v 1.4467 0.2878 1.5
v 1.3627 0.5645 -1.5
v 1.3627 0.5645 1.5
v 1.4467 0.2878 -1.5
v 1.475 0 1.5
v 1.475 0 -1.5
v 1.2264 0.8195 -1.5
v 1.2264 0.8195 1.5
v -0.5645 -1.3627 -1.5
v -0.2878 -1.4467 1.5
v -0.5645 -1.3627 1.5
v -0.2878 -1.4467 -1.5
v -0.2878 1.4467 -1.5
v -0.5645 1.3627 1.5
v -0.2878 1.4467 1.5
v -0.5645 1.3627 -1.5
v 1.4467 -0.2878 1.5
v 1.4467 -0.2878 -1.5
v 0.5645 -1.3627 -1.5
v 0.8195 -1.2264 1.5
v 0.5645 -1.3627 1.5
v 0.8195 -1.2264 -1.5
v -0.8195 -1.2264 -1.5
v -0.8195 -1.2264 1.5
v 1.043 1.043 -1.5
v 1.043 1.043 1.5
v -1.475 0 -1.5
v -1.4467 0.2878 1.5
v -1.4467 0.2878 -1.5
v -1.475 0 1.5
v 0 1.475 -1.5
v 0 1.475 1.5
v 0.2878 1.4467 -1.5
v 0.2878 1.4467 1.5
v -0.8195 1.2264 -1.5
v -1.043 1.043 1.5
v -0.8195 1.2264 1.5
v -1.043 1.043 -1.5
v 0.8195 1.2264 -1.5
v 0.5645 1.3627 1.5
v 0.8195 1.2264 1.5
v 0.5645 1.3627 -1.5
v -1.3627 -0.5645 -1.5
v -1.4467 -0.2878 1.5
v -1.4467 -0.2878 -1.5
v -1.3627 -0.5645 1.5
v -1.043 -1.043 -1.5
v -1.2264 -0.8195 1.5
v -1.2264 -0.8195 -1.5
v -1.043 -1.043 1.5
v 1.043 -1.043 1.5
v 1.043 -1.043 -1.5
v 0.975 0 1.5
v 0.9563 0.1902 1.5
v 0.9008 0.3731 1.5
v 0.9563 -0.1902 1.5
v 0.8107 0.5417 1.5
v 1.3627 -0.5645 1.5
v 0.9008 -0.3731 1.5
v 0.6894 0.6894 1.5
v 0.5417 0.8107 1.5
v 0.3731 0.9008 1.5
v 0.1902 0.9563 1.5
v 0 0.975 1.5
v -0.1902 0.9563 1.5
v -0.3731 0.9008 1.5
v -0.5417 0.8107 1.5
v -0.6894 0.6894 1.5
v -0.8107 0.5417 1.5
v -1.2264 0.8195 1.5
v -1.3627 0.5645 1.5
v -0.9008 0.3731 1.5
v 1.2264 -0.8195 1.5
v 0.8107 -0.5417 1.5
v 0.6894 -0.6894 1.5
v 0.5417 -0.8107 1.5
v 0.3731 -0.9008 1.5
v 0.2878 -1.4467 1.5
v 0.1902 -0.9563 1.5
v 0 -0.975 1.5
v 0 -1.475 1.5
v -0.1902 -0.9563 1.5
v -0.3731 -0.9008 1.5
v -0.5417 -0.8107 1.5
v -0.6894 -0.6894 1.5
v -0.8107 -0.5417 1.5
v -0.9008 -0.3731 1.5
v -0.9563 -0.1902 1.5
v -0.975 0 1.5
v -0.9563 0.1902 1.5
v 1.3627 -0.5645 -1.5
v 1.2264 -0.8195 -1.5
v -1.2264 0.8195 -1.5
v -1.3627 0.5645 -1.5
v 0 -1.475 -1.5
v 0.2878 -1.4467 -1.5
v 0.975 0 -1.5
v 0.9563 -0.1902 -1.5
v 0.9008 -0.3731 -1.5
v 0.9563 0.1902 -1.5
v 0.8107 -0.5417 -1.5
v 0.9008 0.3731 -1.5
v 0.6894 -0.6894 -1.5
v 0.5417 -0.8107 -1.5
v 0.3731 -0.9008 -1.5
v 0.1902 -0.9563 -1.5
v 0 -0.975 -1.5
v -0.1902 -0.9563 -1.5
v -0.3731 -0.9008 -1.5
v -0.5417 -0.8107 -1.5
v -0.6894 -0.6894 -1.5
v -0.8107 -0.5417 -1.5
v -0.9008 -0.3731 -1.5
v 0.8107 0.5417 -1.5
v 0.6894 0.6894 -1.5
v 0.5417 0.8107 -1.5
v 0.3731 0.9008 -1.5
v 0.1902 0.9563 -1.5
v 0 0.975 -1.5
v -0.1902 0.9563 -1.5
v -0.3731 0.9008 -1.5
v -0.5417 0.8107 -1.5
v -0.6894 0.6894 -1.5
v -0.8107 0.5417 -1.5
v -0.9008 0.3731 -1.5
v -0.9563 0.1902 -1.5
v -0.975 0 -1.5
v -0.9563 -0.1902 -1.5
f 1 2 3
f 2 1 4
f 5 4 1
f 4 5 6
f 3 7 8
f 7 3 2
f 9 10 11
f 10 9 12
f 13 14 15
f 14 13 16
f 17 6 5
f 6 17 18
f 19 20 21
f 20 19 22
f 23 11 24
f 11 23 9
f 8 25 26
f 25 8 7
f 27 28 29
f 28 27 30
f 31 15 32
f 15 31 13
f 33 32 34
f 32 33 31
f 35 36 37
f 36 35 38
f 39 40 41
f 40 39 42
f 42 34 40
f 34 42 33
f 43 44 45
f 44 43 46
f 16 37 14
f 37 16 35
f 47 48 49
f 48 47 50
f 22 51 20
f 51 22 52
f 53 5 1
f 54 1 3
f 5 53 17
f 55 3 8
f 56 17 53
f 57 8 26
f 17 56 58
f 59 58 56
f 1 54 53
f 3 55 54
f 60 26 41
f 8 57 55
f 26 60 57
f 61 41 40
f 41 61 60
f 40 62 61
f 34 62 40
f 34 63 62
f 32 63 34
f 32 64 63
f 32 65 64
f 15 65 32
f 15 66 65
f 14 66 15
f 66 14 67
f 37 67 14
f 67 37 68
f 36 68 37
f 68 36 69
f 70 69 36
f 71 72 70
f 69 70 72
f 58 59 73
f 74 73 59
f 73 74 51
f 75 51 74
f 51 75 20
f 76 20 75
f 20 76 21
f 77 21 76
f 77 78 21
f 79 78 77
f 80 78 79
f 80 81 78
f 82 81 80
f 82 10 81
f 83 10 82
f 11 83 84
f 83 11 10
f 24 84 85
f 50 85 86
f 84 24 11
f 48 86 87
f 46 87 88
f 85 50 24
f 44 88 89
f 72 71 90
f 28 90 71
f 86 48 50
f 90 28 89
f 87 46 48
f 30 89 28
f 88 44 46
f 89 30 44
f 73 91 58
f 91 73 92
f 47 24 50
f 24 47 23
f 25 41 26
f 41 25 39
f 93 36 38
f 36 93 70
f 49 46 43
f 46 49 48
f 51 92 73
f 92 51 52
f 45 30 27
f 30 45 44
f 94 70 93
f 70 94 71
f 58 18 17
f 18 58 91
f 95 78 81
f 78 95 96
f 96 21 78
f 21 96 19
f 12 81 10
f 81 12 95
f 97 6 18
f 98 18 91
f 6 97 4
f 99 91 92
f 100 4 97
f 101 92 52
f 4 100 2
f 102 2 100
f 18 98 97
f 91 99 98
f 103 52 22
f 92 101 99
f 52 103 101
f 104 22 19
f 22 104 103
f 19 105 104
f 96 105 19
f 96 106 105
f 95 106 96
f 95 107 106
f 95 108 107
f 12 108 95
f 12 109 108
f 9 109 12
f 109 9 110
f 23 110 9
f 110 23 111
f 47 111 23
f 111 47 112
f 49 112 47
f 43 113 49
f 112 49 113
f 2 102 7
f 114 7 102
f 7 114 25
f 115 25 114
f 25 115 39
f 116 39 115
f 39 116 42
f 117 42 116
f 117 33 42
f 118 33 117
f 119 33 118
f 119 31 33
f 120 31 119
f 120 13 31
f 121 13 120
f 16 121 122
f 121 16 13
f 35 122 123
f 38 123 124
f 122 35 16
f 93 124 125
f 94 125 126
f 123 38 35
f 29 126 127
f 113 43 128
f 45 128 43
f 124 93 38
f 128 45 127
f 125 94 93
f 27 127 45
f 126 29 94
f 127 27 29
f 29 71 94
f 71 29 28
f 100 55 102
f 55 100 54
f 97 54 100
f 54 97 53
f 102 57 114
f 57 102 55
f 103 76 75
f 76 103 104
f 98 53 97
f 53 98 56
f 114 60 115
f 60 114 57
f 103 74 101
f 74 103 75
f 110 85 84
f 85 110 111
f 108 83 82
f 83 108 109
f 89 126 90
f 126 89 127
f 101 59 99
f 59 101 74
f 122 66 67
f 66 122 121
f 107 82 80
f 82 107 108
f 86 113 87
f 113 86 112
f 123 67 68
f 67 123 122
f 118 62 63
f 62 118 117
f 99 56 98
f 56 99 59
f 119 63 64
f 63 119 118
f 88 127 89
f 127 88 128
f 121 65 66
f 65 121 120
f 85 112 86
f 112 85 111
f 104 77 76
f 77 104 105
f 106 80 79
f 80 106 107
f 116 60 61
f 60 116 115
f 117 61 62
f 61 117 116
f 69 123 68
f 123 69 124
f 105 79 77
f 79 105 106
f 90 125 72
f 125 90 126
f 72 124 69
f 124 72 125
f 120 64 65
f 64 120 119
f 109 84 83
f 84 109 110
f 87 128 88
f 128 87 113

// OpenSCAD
$fn=32;

difference() {
cylinder(h=3,d=2.95,center=true);
cylinder(h=31,d=1.95,center=true);
}
